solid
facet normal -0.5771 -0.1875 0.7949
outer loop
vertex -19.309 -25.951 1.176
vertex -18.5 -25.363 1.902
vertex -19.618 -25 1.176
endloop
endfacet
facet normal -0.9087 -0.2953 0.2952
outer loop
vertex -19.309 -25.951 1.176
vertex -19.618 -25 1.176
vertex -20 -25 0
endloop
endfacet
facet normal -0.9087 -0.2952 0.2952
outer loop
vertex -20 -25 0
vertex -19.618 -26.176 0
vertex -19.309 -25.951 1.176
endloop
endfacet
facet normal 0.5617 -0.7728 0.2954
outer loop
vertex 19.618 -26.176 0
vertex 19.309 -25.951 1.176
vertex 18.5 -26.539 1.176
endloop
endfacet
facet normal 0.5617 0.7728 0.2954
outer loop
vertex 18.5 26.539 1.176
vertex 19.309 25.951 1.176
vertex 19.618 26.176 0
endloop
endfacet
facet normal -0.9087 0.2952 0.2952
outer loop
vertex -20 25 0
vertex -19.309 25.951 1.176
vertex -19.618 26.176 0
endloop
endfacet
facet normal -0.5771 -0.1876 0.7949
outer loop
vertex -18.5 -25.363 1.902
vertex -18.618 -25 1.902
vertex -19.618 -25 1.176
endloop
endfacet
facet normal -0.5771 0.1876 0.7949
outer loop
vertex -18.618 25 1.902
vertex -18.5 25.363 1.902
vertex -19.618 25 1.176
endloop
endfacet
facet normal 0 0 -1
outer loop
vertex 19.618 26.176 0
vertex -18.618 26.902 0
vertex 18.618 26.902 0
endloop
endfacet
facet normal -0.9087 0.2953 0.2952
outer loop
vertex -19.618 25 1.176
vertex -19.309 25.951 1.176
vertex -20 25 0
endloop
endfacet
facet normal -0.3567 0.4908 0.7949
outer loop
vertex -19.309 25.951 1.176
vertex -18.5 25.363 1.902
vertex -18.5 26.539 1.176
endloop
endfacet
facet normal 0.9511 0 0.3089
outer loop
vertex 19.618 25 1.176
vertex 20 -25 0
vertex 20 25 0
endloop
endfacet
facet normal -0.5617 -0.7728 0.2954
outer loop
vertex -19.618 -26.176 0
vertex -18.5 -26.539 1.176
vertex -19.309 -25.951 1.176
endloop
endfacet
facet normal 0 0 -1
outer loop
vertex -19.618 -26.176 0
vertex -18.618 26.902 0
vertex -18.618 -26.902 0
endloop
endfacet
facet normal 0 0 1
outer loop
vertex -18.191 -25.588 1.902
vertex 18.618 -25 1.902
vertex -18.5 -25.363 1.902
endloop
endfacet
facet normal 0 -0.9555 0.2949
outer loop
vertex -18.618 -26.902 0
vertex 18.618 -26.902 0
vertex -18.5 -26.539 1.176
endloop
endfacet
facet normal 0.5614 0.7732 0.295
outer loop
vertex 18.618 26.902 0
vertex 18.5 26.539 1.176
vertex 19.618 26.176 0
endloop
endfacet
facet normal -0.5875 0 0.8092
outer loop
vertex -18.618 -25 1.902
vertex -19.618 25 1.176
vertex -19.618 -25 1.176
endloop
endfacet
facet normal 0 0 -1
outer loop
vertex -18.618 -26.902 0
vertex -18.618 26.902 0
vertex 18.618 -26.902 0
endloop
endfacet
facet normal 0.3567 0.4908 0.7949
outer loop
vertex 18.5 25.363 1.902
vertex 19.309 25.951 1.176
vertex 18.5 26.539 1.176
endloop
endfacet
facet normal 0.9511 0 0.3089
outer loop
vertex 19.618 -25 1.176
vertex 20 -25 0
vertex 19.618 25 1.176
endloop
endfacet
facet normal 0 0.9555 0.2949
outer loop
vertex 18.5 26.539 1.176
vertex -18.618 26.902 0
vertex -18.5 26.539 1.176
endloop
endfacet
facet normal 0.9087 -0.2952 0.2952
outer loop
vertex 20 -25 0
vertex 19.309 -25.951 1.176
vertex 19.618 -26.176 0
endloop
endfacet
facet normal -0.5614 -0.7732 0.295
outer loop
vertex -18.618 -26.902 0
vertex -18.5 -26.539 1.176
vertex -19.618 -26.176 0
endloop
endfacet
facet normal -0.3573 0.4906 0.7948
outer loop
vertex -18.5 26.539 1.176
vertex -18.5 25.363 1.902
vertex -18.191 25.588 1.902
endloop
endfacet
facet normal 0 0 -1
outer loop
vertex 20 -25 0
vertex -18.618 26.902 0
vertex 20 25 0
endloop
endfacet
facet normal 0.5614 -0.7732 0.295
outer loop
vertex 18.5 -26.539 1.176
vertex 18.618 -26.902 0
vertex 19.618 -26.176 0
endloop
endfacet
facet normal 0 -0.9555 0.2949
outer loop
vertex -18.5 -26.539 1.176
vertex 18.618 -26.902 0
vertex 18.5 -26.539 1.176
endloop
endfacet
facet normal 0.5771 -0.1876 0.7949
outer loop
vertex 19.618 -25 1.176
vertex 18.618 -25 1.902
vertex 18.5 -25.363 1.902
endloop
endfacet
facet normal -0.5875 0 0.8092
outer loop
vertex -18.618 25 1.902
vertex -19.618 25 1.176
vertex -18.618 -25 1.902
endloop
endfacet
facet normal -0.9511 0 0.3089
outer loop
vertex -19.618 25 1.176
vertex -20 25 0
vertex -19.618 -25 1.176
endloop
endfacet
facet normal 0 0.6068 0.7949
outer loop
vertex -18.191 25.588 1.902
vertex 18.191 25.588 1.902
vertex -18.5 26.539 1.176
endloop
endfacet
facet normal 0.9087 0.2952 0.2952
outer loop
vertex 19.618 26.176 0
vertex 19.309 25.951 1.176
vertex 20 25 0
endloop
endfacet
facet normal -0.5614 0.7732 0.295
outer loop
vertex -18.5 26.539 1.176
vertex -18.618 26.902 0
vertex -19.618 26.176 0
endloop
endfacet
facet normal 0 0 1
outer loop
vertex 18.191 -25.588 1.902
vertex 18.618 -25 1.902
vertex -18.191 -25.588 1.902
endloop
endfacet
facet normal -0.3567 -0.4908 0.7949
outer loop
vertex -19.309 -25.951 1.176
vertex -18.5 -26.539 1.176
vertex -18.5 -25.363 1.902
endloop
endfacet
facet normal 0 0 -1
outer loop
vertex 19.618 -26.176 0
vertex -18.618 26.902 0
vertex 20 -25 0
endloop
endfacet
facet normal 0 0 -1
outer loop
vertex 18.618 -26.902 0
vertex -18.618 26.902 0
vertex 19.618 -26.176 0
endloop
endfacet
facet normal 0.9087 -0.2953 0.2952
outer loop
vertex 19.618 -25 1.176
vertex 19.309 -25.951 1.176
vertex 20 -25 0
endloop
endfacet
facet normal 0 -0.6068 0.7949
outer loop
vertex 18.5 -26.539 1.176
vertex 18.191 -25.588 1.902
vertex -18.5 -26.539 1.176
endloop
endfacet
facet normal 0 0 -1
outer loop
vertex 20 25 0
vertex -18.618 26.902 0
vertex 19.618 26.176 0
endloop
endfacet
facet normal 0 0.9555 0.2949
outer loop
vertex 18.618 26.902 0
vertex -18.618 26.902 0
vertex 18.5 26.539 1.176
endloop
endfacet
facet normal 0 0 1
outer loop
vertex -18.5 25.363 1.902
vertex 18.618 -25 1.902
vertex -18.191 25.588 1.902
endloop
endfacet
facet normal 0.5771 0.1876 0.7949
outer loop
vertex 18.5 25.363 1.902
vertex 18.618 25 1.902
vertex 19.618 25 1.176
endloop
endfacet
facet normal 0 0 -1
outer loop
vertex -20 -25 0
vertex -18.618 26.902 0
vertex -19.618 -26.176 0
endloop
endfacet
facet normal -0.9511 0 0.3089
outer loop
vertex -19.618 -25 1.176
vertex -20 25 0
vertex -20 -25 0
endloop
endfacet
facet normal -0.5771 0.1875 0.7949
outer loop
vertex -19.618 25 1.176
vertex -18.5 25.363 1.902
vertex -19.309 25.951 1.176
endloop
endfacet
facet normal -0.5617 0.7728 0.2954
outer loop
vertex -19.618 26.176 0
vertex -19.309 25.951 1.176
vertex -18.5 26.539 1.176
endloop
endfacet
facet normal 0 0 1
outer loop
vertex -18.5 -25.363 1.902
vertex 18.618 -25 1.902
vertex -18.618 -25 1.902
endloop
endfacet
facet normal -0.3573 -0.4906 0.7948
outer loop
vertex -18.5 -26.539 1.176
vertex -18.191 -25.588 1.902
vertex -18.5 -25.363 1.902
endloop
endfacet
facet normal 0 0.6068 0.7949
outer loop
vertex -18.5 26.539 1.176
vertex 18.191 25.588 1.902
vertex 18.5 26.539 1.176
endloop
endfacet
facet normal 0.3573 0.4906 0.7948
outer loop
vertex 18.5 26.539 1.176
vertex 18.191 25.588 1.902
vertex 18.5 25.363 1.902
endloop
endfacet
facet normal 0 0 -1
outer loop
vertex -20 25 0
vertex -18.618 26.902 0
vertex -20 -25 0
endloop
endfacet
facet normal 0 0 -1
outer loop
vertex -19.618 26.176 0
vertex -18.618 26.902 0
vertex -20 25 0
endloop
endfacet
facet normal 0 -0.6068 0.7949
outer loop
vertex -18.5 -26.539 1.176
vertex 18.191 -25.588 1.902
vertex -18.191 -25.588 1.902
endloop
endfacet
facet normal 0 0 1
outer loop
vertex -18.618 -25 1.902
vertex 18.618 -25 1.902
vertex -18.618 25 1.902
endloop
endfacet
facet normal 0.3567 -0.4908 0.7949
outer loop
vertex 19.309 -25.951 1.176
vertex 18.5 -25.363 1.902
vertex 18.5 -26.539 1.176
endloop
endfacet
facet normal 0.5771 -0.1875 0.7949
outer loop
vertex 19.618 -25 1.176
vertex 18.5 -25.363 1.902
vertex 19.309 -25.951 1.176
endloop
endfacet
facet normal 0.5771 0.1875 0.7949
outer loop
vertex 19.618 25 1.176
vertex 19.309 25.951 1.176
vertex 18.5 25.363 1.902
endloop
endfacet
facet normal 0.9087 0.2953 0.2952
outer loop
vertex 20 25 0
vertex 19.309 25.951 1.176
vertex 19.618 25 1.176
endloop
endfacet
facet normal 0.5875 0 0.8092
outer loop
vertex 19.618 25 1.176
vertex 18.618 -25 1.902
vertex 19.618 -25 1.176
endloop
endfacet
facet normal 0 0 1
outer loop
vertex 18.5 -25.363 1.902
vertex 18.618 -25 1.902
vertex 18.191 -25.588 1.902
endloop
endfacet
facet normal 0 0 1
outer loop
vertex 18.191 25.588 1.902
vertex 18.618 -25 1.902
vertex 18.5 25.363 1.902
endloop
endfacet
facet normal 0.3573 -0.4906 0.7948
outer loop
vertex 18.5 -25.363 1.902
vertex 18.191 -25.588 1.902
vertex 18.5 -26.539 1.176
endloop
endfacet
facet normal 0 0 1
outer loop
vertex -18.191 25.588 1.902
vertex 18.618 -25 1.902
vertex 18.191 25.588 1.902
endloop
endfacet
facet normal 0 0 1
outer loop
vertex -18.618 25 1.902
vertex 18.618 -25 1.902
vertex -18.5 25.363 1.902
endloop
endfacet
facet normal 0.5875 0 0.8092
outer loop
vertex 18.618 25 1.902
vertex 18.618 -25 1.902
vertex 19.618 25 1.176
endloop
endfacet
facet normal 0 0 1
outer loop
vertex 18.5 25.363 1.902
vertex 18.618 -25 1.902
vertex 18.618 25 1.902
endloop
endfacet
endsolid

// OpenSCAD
/*
 * Brown Orla-B brush holder (wall-attached).
 */
$fn=10;

module wall(tr, size)
{
  translate(tr)
    hull()
      difference()
      {
        for(t=[ [-1,-1,0], [-1,+1,0], [+1,-1,0], [+1,+1,0] ])
        {
          assign( off = [size[0]/2*t[0], size[1]/2*t[1], 0*t[2]] )
            translate(off)
              sphere(size[2]);
        };
        translate([0,0,-size[2]]) cube(2*size, center=true);
      }
}


wall([0,0,0], [36,50,2]);
